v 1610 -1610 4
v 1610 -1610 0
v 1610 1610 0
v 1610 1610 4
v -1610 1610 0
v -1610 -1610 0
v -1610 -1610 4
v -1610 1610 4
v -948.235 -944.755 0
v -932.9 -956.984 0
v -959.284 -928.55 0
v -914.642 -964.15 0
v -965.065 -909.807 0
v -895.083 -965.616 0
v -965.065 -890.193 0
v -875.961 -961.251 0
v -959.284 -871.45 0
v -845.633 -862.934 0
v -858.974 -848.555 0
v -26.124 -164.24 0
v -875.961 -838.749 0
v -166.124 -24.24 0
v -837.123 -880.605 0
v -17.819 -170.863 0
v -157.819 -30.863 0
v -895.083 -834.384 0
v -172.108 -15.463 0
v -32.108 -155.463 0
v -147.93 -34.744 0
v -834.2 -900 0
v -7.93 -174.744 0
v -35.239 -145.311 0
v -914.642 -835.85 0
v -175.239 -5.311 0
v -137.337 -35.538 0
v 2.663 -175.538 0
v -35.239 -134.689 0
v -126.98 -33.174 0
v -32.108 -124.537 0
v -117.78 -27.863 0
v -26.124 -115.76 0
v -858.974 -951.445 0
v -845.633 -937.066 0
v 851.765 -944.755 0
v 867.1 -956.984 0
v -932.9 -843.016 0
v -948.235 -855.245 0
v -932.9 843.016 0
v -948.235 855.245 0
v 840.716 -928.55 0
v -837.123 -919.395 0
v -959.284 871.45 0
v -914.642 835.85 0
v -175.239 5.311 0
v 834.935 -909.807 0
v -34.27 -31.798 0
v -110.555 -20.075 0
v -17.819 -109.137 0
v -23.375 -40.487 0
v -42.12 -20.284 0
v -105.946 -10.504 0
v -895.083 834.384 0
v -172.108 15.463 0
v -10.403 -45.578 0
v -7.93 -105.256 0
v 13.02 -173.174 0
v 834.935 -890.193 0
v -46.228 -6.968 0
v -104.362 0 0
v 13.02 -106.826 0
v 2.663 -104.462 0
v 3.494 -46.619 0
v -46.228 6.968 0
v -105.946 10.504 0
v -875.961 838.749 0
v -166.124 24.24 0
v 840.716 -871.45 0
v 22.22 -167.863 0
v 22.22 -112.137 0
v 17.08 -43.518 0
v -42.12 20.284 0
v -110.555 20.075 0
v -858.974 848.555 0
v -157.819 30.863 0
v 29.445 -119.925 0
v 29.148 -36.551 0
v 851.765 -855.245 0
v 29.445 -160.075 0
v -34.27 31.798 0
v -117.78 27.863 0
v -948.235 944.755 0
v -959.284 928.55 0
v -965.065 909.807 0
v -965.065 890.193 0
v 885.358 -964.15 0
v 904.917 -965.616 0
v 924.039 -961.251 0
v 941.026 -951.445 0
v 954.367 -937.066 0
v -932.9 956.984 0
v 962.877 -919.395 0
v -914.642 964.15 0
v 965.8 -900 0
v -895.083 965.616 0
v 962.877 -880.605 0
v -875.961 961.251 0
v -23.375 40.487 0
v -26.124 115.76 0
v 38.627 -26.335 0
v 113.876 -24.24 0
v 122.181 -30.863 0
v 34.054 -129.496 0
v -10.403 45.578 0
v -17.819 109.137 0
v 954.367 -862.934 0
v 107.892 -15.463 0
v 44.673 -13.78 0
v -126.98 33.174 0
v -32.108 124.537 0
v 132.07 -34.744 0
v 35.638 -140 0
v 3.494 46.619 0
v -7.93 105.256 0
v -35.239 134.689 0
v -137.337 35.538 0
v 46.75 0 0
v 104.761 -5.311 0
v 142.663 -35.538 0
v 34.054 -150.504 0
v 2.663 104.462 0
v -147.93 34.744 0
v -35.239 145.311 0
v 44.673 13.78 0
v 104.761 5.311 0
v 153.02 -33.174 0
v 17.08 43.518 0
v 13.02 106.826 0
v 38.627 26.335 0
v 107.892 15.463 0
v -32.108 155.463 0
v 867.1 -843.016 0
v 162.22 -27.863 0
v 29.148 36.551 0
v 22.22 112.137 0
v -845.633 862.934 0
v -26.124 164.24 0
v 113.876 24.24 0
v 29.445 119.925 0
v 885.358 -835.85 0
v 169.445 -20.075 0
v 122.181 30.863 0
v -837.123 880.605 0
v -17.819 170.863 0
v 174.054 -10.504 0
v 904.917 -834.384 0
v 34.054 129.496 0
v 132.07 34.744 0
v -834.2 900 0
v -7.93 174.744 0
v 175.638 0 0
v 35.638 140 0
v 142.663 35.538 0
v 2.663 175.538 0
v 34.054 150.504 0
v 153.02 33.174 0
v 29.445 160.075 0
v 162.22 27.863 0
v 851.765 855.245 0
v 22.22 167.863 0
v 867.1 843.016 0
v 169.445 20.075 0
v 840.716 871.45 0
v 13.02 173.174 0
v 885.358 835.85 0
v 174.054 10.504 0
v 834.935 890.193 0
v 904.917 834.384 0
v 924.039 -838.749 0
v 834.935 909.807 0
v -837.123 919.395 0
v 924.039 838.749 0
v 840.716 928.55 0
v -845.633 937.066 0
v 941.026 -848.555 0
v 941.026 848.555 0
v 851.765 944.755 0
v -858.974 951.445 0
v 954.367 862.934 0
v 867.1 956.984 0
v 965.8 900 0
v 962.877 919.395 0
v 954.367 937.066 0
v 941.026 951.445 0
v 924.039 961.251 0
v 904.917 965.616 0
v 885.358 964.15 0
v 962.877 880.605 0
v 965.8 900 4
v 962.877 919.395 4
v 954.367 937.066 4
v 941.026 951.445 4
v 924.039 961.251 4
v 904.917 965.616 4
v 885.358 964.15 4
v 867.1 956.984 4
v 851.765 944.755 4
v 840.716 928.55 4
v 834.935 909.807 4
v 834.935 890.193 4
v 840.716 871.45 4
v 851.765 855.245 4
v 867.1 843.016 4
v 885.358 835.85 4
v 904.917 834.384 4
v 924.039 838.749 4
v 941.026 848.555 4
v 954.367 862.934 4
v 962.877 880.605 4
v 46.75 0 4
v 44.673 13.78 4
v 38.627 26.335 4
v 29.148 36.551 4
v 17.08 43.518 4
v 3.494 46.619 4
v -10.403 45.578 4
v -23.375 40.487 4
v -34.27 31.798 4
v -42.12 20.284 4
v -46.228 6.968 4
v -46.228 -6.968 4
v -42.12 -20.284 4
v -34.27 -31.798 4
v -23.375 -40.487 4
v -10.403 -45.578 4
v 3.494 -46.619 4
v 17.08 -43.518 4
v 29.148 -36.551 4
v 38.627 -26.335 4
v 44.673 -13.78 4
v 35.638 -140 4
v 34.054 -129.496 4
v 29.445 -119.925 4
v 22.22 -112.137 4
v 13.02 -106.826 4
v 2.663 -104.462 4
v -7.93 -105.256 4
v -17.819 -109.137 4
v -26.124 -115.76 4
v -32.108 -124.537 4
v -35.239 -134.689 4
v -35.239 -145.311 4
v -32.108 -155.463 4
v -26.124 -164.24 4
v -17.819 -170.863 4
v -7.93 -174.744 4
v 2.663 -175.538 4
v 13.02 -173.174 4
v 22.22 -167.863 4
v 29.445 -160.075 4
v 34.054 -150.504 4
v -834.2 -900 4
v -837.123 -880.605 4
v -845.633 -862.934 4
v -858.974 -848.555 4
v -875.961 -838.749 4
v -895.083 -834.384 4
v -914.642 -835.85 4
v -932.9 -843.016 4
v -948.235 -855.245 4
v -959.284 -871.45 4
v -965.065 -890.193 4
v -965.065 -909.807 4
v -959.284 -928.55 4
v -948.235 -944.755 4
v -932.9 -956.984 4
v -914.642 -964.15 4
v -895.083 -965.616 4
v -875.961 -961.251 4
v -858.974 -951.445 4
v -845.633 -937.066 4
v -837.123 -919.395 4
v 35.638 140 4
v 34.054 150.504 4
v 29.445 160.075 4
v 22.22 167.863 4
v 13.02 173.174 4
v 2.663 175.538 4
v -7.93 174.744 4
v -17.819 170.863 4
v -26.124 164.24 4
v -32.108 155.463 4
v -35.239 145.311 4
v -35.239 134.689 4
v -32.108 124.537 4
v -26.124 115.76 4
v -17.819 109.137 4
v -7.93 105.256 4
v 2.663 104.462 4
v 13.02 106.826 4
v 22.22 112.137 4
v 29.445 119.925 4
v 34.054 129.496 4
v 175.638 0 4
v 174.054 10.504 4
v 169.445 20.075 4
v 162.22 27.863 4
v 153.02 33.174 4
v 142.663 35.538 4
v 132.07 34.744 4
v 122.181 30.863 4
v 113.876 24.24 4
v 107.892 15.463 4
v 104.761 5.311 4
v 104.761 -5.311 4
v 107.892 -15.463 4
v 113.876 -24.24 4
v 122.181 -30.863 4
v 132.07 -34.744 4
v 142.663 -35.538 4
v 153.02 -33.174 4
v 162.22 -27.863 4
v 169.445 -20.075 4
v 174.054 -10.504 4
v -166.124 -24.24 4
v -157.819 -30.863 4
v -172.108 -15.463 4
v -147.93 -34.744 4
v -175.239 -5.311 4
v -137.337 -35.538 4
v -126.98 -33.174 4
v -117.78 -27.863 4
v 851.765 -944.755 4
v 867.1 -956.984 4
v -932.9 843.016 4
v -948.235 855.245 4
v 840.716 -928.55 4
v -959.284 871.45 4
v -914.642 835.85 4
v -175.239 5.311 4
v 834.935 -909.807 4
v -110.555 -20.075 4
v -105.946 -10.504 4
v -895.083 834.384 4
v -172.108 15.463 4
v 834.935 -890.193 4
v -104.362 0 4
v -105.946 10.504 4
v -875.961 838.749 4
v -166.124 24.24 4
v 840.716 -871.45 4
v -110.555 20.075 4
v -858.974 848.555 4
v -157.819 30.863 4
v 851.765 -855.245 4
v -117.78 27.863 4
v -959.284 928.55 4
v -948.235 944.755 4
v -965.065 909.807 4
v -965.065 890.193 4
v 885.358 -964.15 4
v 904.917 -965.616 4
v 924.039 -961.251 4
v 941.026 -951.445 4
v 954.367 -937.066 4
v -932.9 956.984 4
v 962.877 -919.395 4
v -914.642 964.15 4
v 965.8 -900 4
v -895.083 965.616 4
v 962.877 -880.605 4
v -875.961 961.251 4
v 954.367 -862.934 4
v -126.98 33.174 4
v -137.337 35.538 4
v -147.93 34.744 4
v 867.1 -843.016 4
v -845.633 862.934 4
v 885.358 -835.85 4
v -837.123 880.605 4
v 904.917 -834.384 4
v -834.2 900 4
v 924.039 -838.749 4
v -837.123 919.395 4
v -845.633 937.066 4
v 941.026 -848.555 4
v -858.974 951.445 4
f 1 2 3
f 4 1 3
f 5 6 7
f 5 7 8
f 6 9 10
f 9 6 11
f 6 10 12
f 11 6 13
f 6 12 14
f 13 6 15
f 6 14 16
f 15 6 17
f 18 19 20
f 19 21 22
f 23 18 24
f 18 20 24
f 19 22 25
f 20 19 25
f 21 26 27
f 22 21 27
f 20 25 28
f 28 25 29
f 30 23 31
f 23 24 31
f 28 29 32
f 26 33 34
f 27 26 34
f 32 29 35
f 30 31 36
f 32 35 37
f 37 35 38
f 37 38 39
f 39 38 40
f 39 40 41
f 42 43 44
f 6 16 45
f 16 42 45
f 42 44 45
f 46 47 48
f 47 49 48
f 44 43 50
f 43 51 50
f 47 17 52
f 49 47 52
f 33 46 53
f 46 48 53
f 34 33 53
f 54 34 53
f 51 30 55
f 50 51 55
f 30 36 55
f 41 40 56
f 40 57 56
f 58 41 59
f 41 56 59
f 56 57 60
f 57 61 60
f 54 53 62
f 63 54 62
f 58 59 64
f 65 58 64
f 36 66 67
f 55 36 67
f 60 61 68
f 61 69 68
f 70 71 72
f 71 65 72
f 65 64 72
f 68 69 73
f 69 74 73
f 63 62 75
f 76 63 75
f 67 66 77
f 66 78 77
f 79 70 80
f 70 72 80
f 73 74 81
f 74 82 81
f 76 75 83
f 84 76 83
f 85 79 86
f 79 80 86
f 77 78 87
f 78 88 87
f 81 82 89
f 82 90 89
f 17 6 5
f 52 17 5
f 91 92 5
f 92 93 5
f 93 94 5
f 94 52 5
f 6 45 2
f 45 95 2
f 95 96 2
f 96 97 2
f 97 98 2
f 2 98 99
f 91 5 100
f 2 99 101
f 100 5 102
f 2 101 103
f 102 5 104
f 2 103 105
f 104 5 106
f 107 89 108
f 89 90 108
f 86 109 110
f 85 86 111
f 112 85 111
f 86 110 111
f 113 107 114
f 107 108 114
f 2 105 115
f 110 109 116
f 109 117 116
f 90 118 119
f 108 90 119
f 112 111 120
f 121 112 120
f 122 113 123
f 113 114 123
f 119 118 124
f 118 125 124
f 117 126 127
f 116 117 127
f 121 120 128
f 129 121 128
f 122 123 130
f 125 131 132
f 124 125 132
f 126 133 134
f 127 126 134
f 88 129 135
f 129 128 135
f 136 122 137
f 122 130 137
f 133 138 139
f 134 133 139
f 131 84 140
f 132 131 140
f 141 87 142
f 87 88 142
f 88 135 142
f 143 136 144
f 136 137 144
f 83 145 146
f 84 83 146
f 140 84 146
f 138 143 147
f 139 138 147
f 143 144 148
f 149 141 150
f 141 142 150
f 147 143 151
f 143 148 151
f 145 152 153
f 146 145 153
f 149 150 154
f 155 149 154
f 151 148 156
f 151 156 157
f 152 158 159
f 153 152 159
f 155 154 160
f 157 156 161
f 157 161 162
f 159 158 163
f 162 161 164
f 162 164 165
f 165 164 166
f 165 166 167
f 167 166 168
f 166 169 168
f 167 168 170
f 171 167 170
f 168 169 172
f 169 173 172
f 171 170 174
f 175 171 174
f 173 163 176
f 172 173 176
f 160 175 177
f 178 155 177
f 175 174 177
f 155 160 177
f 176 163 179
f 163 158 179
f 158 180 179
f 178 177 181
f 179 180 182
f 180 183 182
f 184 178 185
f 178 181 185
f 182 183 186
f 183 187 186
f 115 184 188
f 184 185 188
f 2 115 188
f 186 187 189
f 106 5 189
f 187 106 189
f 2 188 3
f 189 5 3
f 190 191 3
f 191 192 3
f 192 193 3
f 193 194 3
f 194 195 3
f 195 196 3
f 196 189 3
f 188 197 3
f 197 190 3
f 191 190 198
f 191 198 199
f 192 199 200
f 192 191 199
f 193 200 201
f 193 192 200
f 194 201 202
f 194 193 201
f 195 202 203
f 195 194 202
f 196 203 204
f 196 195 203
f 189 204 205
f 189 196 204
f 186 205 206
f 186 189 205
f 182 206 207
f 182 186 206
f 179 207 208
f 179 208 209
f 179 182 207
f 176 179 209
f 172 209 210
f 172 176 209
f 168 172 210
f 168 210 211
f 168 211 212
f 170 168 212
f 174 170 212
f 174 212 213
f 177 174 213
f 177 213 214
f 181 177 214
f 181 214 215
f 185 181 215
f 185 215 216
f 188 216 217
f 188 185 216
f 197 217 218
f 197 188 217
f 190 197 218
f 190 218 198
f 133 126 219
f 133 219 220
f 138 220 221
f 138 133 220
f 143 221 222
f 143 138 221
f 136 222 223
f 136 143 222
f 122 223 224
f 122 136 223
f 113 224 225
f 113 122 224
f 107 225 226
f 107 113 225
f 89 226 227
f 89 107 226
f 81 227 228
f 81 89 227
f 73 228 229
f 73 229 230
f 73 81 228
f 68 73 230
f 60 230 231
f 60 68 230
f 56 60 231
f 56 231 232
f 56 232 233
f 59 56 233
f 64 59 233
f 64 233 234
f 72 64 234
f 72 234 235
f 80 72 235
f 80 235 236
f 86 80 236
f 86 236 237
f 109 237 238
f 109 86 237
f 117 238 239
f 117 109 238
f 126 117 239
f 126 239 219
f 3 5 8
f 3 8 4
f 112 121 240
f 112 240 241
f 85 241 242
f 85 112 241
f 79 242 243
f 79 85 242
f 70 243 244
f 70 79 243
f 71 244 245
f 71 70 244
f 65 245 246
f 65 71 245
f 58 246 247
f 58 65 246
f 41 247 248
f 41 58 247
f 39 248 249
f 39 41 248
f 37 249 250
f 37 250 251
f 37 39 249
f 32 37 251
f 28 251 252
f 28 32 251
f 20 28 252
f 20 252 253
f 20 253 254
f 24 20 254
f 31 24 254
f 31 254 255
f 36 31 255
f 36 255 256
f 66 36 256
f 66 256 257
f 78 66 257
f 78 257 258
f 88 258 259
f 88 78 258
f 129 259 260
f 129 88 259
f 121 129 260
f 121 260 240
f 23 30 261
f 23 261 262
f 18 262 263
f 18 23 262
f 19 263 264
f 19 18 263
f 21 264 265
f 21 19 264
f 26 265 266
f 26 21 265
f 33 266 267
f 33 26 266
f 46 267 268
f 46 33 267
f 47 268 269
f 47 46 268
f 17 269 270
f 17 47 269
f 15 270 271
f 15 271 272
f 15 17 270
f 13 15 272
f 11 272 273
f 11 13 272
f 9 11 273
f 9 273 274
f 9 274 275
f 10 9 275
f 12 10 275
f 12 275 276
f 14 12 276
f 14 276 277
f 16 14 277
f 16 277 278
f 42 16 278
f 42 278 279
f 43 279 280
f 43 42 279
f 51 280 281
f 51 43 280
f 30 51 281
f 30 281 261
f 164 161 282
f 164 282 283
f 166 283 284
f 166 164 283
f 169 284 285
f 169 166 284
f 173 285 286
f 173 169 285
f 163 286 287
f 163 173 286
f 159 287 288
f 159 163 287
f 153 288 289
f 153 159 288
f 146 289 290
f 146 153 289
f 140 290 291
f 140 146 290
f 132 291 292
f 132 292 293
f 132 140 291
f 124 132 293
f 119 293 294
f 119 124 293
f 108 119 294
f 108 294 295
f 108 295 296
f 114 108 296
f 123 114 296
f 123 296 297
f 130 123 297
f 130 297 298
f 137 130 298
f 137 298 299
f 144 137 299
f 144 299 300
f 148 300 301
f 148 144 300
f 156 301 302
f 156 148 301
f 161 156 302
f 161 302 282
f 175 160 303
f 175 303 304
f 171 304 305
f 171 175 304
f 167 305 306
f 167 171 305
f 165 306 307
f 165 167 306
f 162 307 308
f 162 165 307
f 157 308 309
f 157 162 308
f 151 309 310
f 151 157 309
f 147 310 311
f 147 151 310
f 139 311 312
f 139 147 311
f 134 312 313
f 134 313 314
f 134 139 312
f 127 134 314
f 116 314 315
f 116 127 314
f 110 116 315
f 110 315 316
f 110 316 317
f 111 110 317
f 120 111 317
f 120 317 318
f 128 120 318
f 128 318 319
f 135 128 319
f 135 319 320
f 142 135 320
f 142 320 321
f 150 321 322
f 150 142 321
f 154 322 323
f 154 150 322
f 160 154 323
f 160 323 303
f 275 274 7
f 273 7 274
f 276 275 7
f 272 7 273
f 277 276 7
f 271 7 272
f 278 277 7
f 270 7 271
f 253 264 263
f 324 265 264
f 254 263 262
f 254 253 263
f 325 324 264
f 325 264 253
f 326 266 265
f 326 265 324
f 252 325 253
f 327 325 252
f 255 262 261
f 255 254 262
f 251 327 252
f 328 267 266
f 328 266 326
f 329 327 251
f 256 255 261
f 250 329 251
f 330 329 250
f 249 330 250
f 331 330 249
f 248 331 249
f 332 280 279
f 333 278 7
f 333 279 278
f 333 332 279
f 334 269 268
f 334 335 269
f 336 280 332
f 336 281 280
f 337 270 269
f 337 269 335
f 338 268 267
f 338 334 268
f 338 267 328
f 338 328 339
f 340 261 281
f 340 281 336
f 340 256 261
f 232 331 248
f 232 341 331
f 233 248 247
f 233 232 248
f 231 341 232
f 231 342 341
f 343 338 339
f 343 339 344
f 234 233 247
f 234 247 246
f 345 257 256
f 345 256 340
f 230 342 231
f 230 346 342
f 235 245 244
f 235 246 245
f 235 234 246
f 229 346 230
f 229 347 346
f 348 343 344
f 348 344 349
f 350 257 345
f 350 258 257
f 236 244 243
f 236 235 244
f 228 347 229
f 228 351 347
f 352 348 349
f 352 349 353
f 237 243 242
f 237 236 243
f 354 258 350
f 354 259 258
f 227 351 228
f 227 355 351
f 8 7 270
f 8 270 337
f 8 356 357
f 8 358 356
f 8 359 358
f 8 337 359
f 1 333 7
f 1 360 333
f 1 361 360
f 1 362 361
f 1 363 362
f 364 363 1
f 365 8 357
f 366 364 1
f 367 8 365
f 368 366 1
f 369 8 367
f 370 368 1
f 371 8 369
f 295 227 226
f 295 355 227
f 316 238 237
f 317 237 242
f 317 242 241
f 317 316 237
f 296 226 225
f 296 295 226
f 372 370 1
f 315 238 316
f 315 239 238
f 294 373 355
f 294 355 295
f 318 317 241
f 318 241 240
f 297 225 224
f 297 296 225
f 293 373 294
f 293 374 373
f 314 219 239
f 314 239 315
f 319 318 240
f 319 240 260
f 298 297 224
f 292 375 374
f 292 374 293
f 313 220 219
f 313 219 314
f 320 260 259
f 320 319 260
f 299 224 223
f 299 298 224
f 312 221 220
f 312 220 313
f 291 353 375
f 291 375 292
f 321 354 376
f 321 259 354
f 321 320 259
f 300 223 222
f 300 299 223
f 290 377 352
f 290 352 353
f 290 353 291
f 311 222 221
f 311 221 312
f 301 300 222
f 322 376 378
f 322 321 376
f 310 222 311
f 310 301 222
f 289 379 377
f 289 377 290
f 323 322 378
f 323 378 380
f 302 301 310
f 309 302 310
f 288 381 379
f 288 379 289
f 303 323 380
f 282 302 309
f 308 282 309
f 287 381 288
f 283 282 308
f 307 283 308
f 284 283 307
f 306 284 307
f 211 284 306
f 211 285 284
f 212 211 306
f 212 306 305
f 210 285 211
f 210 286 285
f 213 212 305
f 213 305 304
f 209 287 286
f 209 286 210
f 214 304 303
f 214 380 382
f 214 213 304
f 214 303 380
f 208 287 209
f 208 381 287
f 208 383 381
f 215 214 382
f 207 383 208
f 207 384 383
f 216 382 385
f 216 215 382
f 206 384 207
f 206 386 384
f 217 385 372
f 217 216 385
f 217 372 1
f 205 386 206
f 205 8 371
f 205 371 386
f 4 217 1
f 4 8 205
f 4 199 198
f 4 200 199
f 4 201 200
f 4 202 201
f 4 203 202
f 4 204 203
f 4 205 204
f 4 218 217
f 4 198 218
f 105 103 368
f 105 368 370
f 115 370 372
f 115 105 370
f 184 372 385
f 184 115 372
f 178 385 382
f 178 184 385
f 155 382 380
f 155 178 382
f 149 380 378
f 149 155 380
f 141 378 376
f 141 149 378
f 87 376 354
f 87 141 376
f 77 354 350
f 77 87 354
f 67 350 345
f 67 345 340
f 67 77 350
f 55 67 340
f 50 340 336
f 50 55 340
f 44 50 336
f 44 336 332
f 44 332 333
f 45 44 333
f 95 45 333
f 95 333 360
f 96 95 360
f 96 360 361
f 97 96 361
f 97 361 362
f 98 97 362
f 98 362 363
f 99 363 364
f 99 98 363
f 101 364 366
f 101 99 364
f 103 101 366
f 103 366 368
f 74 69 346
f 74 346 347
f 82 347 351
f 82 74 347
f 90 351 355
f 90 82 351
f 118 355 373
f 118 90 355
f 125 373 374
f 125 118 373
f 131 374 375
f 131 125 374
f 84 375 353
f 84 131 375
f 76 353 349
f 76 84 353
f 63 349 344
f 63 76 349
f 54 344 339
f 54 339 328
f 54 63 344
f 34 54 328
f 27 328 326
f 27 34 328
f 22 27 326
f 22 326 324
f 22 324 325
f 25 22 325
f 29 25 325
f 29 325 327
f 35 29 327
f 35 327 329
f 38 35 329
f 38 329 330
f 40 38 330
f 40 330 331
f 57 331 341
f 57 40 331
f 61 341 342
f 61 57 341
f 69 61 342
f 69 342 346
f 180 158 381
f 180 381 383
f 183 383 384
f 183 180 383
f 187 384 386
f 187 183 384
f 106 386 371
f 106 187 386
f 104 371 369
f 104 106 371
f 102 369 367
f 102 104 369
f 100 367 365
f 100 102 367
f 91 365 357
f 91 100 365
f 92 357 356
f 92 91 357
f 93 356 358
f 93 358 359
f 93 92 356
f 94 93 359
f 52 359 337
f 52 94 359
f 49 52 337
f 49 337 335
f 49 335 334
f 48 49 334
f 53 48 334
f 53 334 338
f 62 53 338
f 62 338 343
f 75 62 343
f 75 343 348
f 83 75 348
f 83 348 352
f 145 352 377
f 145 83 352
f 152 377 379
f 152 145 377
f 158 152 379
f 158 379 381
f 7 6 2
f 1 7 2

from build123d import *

# Parameters (mm, degrees)
SKETCH2_W           = 3220
SKETCH2_H           = 3220
SKETCH2_R           = 46.75
SKETCH2_R_2         = 35.6375
SKETCH2_R_3         = 65.8
BOSS_EXTRUDE1_DEPTH = 4


with BuildPart() as part:
    # Sketch2 → Boss-Extrude1 (new body)
    with BuildSketch(Plane.XY):
        Rectangle(SKETCH2_W, SKETCH2_H)
        Circle(SKETCH2_R, mode=Mode.SUBTRACT)
        with Locations((0, 140)):
            Circle(SKETCH2_R_2, mode=Mode.SUBTRACT)
        with Locations((-900, 900)):
            Circle(SKETCH2_R_3, mode=Mode.SUBTRACT)
        with Locations((0, -140)):
            Circle(SKETCH2_R_2, mode=Mode.SUBTRACT)
        with Locations((-900, -900)):
            Circle(SKETCH2_R_3, mode=Mode.SUBTRACT)
        with Locations((140, 0)):
            Circle(SKETCH2_R_2, mode=Mode.SUBTRACT)
        with Locations((-140, 0)):
            Circle(SKETCH2_R_2, mode=Mode.SUBTRACT)
        with Locations((900, -900)):
            Circle(SKETCH2_R_3, mode=Mode.SUBTRACT)
        with Locations((900, 900)):
            Circle(SKETCH2_R_3, mode=Mode.SUBTRACT)
    extrude(amount=BOSS_EXTRUDE1_DEPTH)


solid = part.part
